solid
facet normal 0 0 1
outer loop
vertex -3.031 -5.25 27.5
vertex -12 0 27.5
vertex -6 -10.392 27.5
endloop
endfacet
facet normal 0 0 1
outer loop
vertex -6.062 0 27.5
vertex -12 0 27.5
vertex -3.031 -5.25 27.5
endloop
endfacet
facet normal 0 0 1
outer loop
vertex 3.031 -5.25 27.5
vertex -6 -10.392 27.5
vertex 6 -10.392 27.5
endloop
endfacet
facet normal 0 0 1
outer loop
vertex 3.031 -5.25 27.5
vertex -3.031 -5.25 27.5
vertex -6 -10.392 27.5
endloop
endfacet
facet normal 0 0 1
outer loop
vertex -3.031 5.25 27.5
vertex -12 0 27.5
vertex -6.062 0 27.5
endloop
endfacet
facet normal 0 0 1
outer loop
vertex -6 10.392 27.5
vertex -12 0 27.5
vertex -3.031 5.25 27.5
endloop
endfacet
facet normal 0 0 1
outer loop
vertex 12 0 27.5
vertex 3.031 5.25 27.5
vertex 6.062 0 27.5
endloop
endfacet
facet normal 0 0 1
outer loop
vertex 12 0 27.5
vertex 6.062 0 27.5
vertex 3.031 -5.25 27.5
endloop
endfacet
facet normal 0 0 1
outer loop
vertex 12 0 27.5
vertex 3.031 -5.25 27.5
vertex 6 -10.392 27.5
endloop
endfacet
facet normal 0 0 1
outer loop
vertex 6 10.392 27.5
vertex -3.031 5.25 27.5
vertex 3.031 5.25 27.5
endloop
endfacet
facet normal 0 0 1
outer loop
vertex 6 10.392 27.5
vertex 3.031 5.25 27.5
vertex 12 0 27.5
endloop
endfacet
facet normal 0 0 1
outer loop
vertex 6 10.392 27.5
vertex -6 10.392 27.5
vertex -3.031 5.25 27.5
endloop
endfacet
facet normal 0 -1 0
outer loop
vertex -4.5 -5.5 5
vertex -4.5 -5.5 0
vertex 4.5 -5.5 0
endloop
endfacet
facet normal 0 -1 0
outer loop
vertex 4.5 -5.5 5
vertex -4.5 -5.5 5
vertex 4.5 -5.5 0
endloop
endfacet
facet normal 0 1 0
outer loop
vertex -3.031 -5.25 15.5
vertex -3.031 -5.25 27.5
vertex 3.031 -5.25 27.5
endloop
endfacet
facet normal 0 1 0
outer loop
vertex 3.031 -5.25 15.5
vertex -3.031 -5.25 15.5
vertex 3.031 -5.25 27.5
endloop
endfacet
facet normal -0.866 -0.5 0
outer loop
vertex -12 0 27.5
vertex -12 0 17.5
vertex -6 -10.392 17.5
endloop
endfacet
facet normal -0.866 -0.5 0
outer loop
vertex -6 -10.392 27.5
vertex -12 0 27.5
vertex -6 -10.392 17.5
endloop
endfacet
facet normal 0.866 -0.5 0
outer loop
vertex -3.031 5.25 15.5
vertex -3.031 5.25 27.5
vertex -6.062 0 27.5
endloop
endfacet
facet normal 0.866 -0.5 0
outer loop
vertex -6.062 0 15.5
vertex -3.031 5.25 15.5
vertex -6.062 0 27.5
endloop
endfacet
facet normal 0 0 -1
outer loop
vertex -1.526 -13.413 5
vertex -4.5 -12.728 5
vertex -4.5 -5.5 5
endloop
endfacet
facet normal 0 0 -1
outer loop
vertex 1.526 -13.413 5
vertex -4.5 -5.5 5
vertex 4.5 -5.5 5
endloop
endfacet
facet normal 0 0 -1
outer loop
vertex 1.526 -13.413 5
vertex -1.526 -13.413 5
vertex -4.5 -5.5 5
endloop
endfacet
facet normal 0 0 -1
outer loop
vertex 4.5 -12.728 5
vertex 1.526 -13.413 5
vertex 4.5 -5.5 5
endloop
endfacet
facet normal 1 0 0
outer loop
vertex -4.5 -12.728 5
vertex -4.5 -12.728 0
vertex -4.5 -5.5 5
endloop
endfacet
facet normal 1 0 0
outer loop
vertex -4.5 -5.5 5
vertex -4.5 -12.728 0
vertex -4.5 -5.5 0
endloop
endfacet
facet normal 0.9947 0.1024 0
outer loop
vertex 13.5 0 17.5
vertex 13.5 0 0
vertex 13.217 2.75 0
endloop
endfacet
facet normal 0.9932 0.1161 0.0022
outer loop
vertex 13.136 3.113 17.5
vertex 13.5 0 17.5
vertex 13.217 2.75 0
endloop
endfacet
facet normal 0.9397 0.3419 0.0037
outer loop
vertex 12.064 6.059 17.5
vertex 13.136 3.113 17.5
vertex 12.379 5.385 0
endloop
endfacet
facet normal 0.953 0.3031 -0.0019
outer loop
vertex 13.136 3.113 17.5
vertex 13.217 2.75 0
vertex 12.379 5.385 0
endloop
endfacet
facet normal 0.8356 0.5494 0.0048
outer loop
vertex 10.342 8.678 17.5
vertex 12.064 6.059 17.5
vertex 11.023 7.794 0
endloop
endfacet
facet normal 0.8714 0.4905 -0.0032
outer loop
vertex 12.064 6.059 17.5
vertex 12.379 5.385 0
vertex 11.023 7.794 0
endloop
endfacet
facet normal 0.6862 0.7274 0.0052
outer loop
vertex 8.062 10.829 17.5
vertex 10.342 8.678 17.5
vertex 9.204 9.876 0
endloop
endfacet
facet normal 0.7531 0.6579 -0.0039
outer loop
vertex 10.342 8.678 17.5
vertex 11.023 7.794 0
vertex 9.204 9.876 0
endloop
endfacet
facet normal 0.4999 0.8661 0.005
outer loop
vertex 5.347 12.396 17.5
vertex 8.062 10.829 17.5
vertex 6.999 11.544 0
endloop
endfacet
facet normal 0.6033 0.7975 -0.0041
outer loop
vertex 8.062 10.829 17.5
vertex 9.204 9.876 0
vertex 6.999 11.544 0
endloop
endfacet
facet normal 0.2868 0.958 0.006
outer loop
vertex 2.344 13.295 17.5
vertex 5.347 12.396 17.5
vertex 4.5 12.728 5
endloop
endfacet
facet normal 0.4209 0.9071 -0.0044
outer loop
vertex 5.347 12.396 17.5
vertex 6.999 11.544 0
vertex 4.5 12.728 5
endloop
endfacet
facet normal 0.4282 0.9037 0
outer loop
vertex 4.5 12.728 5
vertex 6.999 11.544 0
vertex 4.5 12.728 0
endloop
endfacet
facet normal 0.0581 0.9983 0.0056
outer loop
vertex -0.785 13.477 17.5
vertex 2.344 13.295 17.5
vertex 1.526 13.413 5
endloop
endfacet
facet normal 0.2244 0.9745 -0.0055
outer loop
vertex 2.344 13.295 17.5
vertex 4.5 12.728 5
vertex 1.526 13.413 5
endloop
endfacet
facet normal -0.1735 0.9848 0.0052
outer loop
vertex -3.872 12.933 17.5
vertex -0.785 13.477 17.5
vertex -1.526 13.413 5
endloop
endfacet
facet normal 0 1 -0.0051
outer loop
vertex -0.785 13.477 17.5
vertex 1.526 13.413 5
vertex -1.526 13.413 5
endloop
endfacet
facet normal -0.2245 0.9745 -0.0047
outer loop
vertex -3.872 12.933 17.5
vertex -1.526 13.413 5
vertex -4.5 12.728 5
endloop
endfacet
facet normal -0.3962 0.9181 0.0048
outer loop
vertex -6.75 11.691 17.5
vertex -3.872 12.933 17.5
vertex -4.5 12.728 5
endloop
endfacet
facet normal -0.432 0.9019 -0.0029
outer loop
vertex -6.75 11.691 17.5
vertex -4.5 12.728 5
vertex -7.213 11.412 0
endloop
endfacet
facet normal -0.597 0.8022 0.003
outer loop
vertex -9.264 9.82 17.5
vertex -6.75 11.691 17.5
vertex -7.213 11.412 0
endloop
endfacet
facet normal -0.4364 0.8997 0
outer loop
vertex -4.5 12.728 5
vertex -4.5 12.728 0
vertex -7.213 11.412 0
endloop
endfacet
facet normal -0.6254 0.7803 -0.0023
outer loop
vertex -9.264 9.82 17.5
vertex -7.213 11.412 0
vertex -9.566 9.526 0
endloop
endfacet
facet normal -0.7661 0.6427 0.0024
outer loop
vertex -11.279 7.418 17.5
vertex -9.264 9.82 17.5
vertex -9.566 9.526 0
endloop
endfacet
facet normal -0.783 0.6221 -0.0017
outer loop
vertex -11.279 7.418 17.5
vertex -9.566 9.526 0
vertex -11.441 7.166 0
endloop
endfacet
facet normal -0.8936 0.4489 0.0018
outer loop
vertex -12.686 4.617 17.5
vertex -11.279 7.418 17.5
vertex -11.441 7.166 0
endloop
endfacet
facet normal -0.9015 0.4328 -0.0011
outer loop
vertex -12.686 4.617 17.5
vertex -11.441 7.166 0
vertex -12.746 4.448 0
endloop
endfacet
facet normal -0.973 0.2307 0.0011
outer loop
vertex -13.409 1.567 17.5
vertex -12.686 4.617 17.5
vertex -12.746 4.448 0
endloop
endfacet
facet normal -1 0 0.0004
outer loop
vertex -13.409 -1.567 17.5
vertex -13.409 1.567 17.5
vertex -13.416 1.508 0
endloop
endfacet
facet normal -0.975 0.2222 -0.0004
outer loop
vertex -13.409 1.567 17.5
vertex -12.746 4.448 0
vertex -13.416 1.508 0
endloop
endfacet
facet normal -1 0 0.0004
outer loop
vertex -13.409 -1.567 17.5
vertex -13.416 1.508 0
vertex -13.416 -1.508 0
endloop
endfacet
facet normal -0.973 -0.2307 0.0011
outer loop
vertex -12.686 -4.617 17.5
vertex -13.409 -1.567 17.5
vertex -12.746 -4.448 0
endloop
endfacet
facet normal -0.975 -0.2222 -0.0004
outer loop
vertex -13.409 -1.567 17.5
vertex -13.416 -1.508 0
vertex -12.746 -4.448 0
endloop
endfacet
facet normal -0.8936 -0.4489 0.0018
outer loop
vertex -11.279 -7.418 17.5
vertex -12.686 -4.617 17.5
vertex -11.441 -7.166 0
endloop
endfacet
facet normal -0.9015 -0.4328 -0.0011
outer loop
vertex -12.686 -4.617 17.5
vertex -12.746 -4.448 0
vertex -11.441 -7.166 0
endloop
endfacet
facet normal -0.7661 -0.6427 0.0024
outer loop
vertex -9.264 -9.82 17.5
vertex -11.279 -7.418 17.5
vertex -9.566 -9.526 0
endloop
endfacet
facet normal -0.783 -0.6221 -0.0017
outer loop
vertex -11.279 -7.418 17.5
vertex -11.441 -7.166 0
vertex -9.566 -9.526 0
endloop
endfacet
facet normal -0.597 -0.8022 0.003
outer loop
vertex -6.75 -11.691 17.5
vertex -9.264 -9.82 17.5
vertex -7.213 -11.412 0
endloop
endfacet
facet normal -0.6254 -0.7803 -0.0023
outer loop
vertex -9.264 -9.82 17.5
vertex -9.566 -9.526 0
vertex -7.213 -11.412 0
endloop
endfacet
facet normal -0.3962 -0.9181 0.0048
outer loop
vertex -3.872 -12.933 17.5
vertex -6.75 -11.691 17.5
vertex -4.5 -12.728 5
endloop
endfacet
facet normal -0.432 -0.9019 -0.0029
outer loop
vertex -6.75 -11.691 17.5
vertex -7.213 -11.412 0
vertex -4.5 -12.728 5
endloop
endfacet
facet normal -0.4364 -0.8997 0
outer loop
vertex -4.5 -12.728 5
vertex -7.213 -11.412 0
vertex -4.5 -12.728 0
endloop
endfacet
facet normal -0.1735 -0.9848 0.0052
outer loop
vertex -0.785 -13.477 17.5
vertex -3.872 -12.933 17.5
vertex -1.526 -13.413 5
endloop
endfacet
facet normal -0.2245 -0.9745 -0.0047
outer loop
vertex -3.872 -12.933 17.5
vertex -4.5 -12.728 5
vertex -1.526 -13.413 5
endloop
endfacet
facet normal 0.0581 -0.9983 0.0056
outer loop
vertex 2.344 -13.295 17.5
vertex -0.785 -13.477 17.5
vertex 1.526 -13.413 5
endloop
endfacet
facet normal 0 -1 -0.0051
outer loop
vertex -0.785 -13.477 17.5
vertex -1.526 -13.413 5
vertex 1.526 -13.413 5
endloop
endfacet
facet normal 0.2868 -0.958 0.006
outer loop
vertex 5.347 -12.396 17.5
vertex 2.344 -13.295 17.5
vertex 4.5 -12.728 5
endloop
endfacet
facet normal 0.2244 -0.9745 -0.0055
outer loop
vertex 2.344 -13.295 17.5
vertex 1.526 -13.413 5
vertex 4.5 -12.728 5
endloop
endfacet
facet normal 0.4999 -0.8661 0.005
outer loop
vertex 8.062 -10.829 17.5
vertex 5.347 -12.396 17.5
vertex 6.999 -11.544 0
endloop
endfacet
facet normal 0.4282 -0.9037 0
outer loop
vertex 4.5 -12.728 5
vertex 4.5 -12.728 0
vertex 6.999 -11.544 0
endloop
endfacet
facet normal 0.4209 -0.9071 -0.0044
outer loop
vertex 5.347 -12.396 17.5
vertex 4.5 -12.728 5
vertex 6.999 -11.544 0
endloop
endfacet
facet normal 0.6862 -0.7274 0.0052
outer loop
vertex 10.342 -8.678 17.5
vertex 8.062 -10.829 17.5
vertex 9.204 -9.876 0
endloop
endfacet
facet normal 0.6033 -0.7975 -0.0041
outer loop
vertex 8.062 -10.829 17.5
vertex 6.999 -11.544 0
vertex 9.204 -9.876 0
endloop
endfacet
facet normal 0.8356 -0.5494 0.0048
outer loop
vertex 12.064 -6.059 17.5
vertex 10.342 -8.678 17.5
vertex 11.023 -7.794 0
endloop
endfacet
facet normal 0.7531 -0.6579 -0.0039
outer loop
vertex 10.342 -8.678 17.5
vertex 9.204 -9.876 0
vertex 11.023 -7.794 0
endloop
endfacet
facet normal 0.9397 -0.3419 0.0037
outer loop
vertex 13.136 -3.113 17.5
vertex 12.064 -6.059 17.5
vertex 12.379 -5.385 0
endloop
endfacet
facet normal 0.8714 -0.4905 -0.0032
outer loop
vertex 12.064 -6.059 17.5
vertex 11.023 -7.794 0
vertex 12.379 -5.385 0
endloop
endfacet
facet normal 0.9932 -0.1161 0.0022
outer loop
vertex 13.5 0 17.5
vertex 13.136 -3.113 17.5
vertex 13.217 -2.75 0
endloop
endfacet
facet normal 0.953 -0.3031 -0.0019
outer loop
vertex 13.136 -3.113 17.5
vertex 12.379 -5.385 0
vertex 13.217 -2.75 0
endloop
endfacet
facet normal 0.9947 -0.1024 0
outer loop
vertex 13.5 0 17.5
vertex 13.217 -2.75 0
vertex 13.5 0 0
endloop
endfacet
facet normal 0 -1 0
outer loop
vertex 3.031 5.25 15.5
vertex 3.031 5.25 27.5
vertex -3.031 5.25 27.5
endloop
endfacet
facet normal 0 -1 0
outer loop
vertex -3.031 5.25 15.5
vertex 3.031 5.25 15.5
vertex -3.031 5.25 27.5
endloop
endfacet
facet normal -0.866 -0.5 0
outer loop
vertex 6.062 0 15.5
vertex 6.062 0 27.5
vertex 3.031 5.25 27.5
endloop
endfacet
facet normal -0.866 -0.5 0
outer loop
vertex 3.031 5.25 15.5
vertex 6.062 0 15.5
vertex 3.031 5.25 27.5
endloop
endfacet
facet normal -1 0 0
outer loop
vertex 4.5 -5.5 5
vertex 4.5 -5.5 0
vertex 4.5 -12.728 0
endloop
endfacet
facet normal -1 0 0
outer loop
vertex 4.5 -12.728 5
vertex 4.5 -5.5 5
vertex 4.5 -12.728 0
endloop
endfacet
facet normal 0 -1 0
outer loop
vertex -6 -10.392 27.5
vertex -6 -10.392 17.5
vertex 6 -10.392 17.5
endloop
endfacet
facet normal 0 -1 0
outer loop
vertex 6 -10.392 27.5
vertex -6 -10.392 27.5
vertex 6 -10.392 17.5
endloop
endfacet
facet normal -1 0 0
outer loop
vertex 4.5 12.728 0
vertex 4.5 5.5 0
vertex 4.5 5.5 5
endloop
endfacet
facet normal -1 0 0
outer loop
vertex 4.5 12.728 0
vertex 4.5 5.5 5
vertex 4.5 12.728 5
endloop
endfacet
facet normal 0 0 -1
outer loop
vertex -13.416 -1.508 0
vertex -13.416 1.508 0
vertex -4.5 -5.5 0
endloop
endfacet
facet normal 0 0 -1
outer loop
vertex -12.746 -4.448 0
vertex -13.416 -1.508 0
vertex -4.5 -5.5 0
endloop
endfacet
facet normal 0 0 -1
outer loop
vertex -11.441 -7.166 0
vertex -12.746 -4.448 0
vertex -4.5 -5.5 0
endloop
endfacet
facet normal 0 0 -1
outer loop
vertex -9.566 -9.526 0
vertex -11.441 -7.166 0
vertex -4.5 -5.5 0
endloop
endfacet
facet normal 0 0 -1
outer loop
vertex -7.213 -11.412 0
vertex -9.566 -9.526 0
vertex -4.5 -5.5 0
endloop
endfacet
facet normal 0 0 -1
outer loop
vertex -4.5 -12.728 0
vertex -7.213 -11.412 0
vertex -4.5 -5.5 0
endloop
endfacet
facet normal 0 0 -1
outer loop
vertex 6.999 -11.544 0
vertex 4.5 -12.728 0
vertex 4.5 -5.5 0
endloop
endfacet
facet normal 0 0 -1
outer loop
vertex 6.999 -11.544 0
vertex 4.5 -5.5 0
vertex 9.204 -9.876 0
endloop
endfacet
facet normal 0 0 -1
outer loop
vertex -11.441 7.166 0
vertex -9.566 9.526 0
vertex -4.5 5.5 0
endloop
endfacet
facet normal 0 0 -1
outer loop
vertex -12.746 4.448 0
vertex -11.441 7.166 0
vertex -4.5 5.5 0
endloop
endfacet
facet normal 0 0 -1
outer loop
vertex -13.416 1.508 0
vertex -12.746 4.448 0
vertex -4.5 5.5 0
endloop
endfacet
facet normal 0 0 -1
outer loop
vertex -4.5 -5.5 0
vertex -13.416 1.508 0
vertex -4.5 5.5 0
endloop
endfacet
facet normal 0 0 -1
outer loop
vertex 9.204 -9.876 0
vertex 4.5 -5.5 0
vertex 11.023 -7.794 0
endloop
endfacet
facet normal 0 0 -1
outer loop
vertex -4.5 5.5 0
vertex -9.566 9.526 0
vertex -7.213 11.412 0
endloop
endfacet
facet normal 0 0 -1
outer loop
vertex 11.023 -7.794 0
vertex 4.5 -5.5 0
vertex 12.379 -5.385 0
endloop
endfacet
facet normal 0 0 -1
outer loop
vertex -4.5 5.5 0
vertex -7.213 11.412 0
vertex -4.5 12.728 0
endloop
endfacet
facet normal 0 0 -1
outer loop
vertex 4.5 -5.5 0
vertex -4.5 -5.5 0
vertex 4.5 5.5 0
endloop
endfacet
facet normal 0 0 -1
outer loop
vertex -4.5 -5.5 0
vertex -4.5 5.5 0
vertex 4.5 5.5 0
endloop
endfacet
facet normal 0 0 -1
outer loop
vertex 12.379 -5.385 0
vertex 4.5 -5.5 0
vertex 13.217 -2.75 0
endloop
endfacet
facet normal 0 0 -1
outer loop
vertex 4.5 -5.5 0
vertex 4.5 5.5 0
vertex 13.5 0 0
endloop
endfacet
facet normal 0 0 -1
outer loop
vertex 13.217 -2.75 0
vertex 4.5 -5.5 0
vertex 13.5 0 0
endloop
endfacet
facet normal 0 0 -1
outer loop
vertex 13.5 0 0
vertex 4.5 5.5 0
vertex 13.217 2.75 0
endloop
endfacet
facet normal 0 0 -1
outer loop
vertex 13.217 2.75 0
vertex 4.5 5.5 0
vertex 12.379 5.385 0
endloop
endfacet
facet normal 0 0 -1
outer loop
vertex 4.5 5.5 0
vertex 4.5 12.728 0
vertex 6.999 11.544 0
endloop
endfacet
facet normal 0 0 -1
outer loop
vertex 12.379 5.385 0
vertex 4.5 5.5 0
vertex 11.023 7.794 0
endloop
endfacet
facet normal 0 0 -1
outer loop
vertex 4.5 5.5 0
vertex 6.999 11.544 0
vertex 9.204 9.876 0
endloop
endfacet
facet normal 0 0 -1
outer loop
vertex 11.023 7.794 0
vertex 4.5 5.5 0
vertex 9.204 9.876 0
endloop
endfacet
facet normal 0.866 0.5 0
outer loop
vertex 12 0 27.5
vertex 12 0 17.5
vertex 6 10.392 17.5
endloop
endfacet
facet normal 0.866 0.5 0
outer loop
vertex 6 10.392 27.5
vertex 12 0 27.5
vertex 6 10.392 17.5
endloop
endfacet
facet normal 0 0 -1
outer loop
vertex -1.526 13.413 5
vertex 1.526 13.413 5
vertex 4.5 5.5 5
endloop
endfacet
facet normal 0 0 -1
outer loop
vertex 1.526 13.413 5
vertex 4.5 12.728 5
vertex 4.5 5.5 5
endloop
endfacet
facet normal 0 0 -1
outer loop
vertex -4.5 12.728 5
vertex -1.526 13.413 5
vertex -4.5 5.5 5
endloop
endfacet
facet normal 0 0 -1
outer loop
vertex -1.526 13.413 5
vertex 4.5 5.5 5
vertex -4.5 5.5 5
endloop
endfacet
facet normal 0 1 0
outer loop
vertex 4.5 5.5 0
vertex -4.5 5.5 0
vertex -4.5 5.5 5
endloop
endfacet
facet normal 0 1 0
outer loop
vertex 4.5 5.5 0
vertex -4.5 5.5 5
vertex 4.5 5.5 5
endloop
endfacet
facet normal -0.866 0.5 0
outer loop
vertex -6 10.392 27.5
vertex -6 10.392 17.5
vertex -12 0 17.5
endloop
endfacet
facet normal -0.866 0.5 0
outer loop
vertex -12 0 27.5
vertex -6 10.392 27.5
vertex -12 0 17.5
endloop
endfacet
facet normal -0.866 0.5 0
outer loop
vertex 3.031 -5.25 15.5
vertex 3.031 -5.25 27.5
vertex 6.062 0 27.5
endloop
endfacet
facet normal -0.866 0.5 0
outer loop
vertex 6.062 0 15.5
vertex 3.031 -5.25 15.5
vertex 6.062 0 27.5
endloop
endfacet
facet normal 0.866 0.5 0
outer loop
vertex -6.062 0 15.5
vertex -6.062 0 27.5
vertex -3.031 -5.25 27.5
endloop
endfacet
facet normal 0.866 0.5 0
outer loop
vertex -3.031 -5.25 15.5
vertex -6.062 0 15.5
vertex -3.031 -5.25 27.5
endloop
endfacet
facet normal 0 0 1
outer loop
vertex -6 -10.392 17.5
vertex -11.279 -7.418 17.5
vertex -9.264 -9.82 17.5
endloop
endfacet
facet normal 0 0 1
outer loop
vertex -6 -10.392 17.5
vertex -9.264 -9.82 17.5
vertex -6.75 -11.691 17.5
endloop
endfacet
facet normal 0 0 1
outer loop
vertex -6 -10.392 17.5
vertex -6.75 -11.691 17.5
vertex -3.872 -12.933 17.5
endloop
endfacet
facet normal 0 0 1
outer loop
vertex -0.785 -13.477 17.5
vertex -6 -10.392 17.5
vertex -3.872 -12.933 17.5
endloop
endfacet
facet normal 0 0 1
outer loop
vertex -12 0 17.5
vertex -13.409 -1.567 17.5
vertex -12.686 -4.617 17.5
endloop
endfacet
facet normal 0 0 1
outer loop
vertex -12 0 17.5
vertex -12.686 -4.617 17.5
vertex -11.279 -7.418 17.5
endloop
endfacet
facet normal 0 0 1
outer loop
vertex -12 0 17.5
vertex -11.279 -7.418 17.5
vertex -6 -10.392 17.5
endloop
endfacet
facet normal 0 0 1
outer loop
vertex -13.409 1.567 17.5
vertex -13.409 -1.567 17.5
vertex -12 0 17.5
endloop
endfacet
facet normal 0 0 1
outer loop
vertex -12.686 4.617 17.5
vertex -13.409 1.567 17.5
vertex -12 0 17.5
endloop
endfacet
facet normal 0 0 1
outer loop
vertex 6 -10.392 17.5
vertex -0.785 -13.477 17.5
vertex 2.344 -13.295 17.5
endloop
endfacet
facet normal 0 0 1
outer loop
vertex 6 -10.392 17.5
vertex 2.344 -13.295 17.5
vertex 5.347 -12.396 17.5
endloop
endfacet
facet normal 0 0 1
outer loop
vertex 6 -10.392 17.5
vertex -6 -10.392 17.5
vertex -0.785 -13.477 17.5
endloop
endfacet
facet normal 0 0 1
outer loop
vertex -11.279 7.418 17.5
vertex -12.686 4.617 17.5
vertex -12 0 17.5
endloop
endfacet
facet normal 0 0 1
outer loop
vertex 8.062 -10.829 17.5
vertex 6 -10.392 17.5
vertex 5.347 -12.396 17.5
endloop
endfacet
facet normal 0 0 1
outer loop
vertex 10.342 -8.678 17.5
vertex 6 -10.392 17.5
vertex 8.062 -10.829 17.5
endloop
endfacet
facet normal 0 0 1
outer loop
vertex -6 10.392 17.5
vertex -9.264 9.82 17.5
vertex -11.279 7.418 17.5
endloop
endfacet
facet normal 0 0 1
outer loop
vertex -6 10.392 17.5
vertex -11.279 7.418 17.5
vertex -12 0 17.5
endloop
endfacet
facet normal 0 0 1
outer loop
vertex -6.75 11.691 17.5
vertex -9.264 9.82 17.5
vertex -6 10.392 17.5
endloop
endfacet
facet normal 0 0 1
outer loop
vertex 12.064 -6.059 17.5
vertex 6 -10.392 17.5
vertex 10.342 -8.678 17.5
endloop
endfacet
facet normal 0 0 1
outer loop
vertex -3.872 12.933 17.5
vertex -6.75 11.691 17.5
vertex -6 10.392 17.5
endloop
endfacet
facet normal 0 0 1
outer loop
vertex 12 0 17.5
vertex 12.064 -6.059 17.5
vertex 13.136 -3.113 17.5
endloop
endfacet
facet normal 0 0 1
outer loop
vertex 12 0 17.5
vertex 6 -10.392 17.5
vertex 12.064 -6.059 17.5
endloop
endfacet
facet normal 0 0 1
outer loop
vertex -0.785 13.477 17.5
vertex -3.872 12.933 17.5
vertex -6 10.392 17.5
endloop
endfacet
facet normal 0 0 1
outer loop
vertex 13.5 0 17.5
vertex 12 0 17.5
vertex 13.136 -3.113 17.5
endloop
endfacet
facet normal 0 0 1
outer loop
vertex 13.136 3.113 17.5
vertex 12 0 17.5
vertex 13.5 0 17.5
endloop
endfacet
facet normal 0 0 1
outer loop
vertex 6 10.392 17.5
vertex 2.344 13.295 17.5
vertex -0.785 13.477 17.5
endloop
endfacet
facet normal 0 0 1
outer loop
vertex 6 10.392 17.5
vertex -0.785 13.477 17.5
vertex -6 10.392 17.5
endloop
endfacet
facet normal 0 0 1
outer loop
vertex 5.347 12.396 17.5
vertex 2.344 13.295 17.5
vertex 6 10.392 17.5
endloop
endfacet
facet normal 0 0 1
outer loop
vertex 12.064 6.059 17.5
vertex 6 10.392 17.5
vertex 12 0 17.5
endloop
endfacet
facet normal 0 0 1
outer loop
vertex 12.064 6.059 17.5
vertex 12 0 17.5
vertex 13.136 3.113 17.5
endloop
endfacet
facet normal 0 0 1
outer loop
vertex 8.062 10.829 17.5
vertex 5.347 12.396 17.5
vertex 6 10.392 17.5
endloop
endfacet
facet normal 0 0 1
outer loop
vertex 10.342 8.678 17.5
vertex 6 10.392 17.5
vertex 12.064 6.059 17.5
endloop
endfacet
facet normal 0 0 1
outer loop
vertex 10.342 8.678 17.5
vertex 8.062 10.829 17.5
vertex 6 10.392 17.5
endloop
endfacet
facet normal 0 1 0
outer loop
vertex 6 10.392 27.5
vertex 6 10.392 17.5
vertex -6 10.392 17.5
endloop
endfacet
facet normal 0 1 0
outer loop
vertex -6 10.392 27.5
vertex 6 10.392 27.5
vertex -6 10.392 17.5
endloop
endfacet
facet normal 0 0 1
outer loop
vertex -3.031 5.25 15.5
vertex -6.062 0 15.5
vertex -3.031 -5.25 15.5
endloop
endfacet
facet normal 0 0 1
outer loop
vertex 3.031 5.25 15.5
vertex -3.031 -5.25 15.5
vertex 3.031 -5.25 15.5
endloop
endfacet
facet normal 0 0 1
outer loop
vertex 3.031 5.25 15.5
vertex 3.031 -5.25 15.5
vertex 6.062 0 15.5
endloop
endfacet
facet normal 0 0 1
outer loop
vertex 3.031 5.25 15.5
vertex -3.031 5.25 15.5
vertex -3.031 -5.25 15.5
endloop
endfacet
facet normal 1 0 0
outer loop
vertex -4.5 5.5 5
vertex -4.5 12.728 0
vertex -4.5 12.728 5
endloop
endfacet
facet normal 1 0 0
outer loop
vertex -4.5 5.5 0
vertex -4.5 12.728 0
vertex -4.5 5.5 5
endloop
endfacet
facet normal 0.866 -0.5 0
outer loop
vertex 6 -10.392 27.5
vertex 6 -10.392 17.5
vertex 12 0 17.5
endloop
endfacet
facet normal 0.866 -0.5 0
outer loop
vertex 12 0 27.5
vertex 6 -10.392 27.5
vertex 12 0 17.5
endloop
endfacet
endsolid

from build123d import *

# Parameters (mm, degrees)
SKETCH_R        = 13.5
PAD_DEPTH       = 17.5
PAD001_DEPTH    = 10
POCKET_DEPTH    = 12
POCKET001_DEPTH = 5


with BuildPart() as part:
    # Sketch → Pad (new body)
    with BuildSketch(Plane.XY):
        Circle(SKETCH_R)
    extrude(amount=PAD_DEPTH)

    # Sketch001 (on Face3 of Pad) → Pad001 (join)
    with BuildSketch(Plane.XY.offset(17.5)):
        Polygon((12, 0), (6, 10.392305), (-6, 10.392305), (-12, 0), (-6, -10.392305), (6, -10.392305), align=None)
    extrude(amount=PAD001_DEPTH)

    # Sketch002 (on Face10 of Pad001) → Pocket (cut)
    with BuildSketch(Plane.XY.offset(27.5)):
        Polygon((6.062178, 0), (3.031089, 5.25), (-3.031089, 5.25), (-6.062178, 0), (-3.031089, -5.25), (3.031089, -5.25), align=None)
    extrude(amount=-POCKET_DEPTH, mode=Mode.SUBTRACT)

    # Sketch003 (on Face2 of Pocket) → Pocket001 (cut)
    with BuildSketch(Plane(origin=(0, 0, 0), x_dir=(1, 0, 0), z_dir=(0, 0, -1))):
        with BuildLine():
            Line((-4.5, 12.727922), (-4.5, 5.5))
            Line((-4.5, 5.5), (4.5, 5.5))
            Line((4.5, 5.5), (4.5, 12.727922))
            ThreePointArc((4.5, 12.727922), (0, 13.5), (-4.5, 12.727922))
        make_face()
        with BuildLine():
            Line((-4.5, -5.5), (4.5, -5.5))
            Line((4.5, -5.5), (4.5, -12.727922))
            ThreePointArc((-4.5, -12.727922), (0, -13.5), (4.5, -12.727922))
            Line((-4.5, -12.727922), (-4.5, -5.5))
        make_face()
    extrude(amount=-POCKET001_DEPTH, mode=Mode.SUBTRACT)


solid = part.part
